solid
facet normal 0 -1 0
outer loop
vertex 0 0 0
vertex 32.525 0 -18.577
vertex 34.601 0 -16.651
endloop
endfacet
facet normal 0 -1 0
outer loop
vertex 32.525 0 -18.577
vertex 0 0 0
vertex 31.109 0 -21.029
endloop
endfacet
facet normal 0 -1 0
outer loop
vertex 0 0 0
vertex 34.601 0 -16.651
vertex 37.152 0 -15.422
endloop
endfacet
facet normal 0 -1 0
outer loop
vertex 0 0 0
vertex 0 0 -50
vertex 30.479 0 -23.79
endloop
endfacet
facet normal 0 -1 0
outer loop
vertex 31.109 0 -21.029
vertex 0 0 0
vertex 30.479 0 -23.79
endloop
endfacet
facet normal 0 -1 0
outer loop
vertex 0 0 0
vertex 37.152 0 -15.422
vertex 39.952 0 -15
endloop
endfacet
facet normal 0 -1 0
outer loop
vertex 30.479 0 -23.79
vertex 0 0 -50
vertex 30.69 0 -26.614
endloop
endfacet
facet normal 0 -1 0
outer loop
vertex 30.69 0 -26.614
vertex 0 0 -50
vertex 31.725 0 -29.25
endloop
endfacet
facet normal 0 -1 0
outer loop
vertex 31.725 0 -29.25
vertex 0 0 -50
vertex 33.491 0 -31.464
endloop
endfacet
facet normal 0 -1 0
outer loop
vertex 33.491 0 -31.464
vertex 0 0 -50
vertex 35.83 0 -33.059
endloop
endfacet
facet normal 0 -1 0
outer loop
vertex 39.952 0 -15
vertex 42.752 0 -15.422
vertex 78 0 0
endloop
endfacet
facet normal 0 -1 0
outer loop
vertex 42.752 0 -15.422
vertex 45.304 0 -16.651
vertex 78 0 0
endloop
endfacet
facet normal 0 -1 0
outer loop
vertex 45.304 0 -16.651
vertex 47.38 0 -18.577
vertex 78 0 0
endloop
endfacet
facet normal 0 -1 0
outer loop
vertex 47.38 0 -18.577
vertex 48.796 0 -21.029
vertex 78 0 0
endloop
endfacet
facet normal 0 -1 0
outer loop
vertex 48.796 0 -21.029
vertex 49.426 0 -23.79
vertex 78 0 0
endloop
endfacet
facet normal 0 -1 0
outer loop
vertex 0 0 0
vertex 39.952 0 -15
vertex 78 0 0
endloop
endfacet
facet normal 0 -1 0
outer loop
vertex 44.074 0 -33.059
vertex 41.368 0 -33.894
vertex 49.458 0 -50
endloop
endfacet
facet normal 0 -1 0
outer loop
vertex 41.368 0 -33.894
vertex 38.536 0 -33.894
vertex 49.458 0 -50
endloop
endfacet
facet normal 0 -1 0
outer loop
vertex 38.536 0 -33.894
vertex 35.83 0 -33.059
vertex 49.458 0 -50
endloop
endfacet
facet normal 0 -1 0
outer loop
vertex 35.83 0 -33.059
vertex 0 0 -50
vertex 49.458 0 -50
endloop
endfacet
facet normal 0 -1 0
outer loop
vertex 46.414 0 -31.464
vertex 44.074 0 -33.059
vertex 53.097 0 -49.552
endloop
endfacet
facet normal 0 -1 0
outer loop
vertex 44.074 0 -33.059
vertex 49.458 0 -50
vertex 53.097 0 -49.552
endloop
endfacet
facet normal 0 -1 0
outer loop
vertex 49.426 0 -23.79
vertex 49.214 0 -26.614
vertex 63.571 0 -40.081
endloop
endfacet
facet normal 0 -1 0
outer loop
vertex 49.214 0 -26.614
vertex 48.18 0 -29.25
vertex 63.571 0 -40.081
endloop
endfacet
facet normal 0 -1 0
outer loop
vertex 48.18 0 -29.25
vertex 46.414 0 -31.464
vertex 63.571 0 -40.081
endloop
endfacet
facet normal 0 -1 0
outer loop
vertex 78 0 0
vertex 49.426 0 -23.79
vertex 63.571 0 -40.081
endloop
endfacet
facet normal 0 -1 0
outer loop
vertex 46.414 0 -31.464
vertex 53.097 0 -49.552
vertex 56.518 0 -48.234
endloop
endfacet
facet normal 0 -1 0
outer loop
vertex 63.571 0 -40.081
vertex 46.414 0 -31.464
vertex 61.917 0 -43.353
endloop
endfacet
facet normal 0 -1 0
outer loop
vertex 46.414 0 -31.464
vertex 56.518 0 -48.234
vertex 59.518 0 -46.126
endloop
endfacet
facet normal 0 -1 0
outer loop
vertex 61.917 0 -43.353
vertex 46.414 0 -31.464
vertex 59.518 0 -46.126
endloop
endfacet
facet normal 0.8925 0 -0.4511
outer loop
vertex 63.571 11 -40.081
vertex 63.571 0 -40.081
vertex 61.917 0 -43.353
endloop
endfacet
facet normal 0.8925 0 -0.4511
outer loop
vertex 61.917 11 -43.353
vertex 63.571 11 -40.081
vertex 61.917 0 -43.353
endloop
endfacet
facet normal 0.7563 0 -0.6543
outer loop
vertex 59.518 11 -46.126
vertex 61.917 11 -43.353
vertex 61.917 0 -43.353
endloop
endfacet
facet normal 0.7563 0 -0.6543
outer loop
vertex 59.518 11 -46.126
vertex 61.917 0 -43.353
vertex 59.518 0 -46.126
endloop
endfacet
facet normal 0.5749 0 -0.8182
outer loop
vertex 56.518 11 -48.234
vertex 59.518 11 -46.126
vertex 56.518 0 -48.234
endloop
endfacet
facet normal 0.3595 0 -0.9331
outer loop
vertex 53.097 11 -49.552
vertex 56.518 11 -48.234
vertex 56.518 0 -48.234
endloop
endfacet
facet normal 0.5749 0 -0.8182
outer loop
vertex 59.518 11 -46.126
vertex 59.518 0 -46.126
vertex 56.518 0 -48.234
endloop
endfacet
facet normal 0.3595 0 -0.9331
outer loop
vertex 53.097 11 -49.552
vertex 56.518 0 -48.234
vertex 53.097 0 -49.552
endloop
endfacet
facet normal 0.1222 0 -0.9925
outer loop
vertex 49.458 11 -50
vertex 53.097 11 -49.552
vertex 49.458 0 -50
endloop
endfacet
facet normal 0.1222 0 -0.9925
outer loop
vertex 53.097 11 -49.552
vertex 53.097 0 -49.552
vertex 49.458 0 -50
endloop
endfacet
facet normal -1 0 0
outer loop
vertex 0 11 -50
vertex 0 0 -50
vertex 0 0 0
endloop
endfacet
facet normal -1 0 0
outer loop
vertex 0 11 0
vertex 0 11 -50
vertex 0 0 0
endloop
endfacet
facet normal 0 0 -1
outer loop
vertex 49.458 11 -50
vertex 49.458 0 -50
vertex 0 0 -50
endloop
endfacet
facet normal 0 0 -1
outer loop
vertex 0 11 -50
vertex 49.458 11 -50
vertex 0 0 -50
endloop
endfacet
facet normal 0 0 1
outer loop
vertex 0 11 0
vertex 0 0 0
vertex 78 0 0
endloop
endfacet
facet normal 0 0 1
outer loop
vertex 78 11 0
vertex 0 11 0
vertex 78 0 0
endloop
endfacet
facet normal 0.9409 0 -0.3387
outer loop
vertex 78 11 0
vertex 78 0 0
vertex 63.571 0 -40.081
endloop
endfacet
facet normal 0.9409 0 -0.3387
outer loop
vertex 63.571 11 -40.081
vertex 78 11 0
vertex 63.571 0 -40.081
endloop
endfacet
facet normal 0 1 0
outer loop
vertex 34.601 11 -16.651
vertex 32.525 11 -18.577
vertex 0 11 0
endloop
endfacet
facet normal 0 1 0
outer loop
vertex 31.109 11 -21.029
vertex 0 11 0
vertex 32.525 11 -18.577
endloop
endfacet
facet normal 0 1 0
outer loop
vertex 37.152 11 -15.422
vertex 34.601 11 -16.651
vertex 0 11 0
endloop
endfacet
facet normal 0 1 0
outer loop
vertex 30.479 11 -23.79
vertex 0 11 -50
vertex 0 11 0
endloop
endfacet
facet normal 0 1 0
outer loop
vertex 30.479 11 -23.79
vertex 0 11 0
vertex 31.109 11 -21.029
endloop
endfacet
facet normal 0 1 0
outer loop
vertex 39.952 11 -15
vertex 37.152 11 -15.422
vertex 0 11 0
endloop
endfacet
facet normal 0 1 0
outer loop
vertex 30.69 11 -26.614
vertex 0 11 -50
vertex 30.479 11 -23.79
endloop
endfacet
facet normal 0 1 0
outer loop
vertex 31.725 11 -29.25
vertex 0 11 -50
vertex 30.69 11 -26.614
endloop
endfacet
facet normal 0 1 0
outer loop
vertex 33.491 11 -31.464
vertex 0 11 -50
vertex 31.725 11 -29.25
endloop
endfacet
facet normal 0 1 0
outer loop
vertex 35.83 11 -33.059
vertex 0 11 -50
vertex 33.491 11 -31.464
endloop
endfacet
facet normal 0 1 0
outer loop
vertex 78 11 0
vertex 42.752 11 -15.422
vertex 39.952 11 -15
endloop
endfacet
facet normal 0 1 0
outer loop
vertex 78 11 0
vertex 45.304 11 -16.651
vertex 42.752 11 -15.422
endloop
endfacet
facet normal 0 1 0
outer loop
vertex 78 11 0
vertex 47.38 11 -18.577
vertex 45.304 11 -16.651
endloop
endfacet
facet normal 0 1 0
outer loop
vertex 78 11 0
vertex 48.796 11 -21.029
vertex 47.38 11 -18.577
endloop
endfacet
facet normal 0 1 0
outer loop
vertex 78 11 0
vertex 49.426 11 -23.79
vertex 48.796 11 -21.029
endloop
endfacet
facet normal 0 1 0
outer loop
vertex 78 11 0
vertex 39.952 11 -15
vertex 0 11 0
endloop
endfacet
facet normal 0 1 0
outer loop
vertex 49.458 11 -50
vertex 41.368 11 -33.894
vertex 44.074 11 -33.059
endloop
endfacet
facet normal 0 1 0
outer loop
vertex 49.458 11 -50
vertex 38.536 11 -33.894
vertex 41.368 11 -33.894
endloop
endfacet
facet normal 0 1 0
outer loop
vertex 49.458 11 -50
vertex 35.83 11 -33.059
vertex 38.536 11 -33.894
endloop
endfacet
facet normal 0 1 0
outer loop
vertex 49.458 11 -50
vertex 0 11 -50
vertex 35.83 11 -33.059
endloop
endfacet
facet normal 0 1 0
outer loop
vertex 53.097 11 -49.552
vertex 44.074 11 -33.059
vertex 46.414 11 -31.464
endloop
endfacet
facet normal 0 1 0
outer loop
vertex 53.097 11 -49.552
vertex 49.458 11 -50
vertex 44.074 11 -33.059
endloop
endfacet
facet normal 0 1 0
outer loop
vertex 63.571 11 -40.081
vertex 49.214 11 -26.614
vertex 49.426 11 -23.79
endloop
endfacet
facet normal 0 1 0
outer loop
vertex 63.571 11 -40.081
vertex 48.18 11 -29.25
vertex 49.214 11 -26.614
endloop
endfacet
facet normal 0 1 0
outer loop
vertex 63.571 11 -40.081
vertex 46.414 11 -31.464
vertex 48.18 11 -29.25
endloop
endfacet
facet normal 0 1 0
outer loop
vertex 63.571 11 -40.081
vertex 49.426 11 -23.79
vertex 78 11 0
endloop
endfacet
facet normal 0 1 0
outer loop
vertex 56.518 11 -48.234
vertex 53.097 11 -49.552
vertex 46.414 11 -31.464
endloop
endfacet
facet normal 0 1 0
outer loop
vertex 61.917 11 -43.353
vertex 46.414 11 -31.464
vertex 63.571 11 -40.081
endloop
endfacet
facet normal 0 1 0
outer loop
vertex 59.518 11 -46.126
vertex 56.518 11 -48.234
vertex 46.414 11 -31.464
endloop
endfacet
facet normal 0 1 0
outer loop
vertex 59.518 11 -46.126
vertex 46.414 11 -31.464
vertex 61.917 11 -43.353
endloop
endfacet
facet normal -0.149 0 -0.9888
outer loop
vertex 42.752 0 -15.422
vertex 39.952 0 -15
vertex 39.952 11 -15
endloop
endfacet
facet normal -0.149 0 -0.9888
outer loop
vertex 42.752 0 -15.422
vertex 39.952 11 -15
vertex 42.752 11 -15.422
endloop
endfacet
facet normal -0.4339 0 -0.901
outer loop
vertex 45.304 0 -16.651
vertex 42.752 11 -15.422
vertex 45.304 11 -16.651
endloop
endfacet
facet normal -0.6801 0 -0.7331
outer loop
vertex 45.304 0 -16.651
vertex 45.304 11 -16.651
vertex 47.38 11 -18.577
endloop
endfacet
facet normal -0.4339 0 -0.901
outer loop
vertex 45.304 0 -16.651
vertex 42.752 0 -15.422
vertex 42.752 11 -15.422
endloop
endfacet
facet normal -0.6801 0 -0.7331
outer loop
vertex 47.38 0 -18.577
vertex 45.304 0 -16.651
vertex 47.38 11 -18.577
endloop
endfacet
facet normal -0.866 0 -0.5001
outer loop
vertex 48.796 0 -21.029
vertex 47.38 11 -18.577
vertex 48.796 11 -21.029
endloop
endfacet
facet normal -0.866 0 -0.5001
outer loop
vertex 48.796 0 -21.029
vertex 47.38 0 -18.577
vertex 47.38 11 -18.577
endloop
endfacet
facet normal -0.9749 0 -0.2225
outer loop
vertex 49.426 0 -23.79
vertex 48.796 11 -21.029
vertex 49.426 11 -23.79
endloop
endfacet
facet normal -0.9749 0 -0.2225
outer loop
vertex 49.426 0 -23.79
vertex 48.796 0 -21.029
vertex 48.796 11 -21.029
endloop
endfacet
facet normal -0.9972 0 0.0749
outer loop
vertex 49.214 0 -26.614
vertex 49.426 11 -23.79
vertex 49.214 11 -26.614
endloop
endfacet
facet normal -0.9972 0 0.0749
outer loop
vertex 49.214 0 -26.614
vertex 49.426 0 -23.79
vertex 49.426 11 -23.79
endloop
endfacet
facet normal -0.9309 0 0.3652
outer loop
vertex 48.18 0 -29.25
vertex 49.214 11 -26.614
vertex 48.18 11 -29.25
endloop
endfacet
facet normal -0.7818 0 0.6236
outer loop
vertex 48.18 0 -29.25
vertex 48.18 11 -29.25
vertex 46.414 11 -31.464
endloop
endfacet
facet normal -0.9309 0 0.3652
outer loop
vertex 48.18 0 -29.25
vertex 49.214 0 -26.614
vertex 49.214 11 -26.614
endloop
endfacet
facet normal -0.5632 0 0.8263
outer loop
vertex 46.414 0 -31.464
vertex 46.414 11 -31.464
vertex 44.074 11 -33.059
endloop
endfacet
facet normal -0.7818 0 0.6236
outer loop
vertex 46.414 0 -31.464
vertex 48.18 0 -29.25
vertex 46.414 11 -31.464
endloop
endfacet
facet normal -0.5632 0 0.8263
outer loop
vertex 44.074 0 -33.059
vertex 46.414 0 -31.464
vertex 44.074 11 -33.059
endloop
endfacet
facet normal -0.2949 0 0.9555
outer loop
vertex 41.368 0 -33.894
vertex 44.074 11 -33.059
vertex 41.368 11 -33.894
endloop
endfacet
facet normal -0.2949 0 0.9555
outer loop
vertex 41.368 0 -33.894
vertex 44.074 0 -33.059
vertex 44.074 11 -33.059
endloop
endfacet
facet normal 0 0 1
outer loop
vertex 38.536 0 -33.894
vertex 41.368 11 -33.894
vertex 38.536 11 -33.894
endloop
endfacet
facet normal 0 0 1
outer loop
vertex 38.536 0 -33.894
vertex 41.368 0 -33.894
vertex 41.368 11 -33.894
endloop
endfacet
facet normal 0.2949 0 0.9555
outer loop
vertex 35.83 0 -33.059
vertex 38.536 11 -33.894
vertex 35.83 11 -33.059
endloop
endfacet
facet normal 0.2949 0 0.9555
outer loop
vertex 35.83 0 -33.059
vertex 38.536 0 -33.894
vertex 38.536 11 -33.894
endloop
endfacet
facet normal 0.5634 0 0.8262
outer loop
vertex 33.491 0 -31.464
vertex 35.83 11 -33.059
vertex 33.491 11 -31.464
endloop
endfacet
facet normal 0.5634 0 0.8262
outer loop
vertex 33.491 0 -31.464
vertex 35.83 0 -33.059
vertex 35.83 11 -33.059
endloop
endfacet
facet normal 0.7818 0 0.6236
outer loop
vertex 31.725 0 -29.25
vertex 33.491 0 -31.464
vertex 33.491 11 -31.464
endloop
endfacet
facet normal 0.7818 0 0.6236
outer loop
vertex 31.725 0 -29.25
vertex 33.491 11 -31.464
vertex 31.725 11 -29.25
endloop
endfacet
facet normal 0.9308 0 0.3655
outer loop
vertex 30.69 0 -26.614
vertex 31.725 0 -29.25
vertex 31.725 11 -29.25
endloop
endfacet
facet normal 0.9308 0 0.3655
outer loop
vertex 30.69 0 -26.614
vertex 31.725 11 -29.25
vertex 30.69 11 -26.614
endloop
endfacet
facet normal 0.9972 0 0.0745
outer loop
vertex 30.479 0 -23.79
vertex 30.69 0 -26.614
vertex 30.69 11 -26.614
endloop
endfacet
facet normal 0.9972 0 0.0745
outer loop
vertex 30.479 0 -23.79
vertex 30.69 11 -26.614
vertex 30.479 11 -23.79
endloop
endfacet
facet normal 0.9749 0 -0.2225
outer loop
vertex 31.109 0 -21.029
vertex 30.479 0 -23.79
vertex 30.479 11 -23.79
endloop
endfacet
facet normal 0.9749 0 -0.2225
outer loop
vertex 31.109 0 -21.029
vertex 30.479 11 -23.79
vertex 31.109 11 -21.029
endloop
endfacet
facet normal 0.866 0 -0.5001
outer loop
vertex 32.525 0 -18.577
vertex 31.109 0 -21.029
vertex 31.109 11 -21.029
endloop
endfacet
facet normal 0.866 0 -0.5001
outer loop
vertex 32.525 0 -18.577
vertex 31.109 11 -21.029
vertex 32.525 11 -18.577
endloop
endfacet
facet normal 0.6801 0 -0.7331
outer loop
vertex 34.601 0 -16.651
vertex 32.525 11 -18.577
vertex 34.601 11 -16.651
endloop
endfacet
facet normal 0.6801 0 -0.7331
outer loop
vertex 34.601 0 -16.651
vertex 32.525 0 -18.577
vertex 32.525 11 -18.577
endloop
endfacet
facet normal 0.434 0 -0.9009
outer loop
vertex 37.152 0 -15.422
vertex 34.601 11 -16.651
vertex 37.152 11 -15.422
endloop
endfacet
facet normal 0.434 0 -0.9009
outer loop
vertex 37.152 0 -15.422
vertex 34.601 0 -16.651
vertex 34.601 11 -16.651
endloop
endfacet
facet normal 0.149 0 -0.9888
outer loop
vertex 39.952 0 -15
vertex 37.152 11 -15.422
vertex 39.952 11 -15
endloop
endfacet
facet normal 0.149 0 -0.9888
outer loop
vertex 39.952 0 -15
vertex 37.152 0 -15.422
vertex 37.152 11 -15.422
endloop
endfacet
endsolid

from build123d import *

# Parameters (mm, degrees)
SKETCH1_R           = 9.5
BOSS_EXTRUDE1_DEPTH = 11


with BuildPart() as part:
    # Sketch1 → Boss-Extrude1 (new body)
    with BuildSketch(Plane(origin=(0, 0, 0), x_dir=(1, 0, 0), z_dir=(0, 1, 0))):
        with BuildLine():
            Line((0, 0), (78, 0))
            Line((78, 0), (63.570914871, 40.080792024))
            ThreePointArc((63.570914871, 40.080792024), (58.082802811, 47.272161186), (49.457603693, 50))
            Line((49.457603693, 50), (0, 50))
            Line((0, 50), (0, 0))
        make_face()
        with Locations(Location((39.952273438, 24.5, 0), (0, 0, 270))):
            Circle(SKETCH1_R, mode=Mode.SUBTRACT)
    extrude(amount=BOSS_EXTRUDE1_DEPTH)


solid = part.part
